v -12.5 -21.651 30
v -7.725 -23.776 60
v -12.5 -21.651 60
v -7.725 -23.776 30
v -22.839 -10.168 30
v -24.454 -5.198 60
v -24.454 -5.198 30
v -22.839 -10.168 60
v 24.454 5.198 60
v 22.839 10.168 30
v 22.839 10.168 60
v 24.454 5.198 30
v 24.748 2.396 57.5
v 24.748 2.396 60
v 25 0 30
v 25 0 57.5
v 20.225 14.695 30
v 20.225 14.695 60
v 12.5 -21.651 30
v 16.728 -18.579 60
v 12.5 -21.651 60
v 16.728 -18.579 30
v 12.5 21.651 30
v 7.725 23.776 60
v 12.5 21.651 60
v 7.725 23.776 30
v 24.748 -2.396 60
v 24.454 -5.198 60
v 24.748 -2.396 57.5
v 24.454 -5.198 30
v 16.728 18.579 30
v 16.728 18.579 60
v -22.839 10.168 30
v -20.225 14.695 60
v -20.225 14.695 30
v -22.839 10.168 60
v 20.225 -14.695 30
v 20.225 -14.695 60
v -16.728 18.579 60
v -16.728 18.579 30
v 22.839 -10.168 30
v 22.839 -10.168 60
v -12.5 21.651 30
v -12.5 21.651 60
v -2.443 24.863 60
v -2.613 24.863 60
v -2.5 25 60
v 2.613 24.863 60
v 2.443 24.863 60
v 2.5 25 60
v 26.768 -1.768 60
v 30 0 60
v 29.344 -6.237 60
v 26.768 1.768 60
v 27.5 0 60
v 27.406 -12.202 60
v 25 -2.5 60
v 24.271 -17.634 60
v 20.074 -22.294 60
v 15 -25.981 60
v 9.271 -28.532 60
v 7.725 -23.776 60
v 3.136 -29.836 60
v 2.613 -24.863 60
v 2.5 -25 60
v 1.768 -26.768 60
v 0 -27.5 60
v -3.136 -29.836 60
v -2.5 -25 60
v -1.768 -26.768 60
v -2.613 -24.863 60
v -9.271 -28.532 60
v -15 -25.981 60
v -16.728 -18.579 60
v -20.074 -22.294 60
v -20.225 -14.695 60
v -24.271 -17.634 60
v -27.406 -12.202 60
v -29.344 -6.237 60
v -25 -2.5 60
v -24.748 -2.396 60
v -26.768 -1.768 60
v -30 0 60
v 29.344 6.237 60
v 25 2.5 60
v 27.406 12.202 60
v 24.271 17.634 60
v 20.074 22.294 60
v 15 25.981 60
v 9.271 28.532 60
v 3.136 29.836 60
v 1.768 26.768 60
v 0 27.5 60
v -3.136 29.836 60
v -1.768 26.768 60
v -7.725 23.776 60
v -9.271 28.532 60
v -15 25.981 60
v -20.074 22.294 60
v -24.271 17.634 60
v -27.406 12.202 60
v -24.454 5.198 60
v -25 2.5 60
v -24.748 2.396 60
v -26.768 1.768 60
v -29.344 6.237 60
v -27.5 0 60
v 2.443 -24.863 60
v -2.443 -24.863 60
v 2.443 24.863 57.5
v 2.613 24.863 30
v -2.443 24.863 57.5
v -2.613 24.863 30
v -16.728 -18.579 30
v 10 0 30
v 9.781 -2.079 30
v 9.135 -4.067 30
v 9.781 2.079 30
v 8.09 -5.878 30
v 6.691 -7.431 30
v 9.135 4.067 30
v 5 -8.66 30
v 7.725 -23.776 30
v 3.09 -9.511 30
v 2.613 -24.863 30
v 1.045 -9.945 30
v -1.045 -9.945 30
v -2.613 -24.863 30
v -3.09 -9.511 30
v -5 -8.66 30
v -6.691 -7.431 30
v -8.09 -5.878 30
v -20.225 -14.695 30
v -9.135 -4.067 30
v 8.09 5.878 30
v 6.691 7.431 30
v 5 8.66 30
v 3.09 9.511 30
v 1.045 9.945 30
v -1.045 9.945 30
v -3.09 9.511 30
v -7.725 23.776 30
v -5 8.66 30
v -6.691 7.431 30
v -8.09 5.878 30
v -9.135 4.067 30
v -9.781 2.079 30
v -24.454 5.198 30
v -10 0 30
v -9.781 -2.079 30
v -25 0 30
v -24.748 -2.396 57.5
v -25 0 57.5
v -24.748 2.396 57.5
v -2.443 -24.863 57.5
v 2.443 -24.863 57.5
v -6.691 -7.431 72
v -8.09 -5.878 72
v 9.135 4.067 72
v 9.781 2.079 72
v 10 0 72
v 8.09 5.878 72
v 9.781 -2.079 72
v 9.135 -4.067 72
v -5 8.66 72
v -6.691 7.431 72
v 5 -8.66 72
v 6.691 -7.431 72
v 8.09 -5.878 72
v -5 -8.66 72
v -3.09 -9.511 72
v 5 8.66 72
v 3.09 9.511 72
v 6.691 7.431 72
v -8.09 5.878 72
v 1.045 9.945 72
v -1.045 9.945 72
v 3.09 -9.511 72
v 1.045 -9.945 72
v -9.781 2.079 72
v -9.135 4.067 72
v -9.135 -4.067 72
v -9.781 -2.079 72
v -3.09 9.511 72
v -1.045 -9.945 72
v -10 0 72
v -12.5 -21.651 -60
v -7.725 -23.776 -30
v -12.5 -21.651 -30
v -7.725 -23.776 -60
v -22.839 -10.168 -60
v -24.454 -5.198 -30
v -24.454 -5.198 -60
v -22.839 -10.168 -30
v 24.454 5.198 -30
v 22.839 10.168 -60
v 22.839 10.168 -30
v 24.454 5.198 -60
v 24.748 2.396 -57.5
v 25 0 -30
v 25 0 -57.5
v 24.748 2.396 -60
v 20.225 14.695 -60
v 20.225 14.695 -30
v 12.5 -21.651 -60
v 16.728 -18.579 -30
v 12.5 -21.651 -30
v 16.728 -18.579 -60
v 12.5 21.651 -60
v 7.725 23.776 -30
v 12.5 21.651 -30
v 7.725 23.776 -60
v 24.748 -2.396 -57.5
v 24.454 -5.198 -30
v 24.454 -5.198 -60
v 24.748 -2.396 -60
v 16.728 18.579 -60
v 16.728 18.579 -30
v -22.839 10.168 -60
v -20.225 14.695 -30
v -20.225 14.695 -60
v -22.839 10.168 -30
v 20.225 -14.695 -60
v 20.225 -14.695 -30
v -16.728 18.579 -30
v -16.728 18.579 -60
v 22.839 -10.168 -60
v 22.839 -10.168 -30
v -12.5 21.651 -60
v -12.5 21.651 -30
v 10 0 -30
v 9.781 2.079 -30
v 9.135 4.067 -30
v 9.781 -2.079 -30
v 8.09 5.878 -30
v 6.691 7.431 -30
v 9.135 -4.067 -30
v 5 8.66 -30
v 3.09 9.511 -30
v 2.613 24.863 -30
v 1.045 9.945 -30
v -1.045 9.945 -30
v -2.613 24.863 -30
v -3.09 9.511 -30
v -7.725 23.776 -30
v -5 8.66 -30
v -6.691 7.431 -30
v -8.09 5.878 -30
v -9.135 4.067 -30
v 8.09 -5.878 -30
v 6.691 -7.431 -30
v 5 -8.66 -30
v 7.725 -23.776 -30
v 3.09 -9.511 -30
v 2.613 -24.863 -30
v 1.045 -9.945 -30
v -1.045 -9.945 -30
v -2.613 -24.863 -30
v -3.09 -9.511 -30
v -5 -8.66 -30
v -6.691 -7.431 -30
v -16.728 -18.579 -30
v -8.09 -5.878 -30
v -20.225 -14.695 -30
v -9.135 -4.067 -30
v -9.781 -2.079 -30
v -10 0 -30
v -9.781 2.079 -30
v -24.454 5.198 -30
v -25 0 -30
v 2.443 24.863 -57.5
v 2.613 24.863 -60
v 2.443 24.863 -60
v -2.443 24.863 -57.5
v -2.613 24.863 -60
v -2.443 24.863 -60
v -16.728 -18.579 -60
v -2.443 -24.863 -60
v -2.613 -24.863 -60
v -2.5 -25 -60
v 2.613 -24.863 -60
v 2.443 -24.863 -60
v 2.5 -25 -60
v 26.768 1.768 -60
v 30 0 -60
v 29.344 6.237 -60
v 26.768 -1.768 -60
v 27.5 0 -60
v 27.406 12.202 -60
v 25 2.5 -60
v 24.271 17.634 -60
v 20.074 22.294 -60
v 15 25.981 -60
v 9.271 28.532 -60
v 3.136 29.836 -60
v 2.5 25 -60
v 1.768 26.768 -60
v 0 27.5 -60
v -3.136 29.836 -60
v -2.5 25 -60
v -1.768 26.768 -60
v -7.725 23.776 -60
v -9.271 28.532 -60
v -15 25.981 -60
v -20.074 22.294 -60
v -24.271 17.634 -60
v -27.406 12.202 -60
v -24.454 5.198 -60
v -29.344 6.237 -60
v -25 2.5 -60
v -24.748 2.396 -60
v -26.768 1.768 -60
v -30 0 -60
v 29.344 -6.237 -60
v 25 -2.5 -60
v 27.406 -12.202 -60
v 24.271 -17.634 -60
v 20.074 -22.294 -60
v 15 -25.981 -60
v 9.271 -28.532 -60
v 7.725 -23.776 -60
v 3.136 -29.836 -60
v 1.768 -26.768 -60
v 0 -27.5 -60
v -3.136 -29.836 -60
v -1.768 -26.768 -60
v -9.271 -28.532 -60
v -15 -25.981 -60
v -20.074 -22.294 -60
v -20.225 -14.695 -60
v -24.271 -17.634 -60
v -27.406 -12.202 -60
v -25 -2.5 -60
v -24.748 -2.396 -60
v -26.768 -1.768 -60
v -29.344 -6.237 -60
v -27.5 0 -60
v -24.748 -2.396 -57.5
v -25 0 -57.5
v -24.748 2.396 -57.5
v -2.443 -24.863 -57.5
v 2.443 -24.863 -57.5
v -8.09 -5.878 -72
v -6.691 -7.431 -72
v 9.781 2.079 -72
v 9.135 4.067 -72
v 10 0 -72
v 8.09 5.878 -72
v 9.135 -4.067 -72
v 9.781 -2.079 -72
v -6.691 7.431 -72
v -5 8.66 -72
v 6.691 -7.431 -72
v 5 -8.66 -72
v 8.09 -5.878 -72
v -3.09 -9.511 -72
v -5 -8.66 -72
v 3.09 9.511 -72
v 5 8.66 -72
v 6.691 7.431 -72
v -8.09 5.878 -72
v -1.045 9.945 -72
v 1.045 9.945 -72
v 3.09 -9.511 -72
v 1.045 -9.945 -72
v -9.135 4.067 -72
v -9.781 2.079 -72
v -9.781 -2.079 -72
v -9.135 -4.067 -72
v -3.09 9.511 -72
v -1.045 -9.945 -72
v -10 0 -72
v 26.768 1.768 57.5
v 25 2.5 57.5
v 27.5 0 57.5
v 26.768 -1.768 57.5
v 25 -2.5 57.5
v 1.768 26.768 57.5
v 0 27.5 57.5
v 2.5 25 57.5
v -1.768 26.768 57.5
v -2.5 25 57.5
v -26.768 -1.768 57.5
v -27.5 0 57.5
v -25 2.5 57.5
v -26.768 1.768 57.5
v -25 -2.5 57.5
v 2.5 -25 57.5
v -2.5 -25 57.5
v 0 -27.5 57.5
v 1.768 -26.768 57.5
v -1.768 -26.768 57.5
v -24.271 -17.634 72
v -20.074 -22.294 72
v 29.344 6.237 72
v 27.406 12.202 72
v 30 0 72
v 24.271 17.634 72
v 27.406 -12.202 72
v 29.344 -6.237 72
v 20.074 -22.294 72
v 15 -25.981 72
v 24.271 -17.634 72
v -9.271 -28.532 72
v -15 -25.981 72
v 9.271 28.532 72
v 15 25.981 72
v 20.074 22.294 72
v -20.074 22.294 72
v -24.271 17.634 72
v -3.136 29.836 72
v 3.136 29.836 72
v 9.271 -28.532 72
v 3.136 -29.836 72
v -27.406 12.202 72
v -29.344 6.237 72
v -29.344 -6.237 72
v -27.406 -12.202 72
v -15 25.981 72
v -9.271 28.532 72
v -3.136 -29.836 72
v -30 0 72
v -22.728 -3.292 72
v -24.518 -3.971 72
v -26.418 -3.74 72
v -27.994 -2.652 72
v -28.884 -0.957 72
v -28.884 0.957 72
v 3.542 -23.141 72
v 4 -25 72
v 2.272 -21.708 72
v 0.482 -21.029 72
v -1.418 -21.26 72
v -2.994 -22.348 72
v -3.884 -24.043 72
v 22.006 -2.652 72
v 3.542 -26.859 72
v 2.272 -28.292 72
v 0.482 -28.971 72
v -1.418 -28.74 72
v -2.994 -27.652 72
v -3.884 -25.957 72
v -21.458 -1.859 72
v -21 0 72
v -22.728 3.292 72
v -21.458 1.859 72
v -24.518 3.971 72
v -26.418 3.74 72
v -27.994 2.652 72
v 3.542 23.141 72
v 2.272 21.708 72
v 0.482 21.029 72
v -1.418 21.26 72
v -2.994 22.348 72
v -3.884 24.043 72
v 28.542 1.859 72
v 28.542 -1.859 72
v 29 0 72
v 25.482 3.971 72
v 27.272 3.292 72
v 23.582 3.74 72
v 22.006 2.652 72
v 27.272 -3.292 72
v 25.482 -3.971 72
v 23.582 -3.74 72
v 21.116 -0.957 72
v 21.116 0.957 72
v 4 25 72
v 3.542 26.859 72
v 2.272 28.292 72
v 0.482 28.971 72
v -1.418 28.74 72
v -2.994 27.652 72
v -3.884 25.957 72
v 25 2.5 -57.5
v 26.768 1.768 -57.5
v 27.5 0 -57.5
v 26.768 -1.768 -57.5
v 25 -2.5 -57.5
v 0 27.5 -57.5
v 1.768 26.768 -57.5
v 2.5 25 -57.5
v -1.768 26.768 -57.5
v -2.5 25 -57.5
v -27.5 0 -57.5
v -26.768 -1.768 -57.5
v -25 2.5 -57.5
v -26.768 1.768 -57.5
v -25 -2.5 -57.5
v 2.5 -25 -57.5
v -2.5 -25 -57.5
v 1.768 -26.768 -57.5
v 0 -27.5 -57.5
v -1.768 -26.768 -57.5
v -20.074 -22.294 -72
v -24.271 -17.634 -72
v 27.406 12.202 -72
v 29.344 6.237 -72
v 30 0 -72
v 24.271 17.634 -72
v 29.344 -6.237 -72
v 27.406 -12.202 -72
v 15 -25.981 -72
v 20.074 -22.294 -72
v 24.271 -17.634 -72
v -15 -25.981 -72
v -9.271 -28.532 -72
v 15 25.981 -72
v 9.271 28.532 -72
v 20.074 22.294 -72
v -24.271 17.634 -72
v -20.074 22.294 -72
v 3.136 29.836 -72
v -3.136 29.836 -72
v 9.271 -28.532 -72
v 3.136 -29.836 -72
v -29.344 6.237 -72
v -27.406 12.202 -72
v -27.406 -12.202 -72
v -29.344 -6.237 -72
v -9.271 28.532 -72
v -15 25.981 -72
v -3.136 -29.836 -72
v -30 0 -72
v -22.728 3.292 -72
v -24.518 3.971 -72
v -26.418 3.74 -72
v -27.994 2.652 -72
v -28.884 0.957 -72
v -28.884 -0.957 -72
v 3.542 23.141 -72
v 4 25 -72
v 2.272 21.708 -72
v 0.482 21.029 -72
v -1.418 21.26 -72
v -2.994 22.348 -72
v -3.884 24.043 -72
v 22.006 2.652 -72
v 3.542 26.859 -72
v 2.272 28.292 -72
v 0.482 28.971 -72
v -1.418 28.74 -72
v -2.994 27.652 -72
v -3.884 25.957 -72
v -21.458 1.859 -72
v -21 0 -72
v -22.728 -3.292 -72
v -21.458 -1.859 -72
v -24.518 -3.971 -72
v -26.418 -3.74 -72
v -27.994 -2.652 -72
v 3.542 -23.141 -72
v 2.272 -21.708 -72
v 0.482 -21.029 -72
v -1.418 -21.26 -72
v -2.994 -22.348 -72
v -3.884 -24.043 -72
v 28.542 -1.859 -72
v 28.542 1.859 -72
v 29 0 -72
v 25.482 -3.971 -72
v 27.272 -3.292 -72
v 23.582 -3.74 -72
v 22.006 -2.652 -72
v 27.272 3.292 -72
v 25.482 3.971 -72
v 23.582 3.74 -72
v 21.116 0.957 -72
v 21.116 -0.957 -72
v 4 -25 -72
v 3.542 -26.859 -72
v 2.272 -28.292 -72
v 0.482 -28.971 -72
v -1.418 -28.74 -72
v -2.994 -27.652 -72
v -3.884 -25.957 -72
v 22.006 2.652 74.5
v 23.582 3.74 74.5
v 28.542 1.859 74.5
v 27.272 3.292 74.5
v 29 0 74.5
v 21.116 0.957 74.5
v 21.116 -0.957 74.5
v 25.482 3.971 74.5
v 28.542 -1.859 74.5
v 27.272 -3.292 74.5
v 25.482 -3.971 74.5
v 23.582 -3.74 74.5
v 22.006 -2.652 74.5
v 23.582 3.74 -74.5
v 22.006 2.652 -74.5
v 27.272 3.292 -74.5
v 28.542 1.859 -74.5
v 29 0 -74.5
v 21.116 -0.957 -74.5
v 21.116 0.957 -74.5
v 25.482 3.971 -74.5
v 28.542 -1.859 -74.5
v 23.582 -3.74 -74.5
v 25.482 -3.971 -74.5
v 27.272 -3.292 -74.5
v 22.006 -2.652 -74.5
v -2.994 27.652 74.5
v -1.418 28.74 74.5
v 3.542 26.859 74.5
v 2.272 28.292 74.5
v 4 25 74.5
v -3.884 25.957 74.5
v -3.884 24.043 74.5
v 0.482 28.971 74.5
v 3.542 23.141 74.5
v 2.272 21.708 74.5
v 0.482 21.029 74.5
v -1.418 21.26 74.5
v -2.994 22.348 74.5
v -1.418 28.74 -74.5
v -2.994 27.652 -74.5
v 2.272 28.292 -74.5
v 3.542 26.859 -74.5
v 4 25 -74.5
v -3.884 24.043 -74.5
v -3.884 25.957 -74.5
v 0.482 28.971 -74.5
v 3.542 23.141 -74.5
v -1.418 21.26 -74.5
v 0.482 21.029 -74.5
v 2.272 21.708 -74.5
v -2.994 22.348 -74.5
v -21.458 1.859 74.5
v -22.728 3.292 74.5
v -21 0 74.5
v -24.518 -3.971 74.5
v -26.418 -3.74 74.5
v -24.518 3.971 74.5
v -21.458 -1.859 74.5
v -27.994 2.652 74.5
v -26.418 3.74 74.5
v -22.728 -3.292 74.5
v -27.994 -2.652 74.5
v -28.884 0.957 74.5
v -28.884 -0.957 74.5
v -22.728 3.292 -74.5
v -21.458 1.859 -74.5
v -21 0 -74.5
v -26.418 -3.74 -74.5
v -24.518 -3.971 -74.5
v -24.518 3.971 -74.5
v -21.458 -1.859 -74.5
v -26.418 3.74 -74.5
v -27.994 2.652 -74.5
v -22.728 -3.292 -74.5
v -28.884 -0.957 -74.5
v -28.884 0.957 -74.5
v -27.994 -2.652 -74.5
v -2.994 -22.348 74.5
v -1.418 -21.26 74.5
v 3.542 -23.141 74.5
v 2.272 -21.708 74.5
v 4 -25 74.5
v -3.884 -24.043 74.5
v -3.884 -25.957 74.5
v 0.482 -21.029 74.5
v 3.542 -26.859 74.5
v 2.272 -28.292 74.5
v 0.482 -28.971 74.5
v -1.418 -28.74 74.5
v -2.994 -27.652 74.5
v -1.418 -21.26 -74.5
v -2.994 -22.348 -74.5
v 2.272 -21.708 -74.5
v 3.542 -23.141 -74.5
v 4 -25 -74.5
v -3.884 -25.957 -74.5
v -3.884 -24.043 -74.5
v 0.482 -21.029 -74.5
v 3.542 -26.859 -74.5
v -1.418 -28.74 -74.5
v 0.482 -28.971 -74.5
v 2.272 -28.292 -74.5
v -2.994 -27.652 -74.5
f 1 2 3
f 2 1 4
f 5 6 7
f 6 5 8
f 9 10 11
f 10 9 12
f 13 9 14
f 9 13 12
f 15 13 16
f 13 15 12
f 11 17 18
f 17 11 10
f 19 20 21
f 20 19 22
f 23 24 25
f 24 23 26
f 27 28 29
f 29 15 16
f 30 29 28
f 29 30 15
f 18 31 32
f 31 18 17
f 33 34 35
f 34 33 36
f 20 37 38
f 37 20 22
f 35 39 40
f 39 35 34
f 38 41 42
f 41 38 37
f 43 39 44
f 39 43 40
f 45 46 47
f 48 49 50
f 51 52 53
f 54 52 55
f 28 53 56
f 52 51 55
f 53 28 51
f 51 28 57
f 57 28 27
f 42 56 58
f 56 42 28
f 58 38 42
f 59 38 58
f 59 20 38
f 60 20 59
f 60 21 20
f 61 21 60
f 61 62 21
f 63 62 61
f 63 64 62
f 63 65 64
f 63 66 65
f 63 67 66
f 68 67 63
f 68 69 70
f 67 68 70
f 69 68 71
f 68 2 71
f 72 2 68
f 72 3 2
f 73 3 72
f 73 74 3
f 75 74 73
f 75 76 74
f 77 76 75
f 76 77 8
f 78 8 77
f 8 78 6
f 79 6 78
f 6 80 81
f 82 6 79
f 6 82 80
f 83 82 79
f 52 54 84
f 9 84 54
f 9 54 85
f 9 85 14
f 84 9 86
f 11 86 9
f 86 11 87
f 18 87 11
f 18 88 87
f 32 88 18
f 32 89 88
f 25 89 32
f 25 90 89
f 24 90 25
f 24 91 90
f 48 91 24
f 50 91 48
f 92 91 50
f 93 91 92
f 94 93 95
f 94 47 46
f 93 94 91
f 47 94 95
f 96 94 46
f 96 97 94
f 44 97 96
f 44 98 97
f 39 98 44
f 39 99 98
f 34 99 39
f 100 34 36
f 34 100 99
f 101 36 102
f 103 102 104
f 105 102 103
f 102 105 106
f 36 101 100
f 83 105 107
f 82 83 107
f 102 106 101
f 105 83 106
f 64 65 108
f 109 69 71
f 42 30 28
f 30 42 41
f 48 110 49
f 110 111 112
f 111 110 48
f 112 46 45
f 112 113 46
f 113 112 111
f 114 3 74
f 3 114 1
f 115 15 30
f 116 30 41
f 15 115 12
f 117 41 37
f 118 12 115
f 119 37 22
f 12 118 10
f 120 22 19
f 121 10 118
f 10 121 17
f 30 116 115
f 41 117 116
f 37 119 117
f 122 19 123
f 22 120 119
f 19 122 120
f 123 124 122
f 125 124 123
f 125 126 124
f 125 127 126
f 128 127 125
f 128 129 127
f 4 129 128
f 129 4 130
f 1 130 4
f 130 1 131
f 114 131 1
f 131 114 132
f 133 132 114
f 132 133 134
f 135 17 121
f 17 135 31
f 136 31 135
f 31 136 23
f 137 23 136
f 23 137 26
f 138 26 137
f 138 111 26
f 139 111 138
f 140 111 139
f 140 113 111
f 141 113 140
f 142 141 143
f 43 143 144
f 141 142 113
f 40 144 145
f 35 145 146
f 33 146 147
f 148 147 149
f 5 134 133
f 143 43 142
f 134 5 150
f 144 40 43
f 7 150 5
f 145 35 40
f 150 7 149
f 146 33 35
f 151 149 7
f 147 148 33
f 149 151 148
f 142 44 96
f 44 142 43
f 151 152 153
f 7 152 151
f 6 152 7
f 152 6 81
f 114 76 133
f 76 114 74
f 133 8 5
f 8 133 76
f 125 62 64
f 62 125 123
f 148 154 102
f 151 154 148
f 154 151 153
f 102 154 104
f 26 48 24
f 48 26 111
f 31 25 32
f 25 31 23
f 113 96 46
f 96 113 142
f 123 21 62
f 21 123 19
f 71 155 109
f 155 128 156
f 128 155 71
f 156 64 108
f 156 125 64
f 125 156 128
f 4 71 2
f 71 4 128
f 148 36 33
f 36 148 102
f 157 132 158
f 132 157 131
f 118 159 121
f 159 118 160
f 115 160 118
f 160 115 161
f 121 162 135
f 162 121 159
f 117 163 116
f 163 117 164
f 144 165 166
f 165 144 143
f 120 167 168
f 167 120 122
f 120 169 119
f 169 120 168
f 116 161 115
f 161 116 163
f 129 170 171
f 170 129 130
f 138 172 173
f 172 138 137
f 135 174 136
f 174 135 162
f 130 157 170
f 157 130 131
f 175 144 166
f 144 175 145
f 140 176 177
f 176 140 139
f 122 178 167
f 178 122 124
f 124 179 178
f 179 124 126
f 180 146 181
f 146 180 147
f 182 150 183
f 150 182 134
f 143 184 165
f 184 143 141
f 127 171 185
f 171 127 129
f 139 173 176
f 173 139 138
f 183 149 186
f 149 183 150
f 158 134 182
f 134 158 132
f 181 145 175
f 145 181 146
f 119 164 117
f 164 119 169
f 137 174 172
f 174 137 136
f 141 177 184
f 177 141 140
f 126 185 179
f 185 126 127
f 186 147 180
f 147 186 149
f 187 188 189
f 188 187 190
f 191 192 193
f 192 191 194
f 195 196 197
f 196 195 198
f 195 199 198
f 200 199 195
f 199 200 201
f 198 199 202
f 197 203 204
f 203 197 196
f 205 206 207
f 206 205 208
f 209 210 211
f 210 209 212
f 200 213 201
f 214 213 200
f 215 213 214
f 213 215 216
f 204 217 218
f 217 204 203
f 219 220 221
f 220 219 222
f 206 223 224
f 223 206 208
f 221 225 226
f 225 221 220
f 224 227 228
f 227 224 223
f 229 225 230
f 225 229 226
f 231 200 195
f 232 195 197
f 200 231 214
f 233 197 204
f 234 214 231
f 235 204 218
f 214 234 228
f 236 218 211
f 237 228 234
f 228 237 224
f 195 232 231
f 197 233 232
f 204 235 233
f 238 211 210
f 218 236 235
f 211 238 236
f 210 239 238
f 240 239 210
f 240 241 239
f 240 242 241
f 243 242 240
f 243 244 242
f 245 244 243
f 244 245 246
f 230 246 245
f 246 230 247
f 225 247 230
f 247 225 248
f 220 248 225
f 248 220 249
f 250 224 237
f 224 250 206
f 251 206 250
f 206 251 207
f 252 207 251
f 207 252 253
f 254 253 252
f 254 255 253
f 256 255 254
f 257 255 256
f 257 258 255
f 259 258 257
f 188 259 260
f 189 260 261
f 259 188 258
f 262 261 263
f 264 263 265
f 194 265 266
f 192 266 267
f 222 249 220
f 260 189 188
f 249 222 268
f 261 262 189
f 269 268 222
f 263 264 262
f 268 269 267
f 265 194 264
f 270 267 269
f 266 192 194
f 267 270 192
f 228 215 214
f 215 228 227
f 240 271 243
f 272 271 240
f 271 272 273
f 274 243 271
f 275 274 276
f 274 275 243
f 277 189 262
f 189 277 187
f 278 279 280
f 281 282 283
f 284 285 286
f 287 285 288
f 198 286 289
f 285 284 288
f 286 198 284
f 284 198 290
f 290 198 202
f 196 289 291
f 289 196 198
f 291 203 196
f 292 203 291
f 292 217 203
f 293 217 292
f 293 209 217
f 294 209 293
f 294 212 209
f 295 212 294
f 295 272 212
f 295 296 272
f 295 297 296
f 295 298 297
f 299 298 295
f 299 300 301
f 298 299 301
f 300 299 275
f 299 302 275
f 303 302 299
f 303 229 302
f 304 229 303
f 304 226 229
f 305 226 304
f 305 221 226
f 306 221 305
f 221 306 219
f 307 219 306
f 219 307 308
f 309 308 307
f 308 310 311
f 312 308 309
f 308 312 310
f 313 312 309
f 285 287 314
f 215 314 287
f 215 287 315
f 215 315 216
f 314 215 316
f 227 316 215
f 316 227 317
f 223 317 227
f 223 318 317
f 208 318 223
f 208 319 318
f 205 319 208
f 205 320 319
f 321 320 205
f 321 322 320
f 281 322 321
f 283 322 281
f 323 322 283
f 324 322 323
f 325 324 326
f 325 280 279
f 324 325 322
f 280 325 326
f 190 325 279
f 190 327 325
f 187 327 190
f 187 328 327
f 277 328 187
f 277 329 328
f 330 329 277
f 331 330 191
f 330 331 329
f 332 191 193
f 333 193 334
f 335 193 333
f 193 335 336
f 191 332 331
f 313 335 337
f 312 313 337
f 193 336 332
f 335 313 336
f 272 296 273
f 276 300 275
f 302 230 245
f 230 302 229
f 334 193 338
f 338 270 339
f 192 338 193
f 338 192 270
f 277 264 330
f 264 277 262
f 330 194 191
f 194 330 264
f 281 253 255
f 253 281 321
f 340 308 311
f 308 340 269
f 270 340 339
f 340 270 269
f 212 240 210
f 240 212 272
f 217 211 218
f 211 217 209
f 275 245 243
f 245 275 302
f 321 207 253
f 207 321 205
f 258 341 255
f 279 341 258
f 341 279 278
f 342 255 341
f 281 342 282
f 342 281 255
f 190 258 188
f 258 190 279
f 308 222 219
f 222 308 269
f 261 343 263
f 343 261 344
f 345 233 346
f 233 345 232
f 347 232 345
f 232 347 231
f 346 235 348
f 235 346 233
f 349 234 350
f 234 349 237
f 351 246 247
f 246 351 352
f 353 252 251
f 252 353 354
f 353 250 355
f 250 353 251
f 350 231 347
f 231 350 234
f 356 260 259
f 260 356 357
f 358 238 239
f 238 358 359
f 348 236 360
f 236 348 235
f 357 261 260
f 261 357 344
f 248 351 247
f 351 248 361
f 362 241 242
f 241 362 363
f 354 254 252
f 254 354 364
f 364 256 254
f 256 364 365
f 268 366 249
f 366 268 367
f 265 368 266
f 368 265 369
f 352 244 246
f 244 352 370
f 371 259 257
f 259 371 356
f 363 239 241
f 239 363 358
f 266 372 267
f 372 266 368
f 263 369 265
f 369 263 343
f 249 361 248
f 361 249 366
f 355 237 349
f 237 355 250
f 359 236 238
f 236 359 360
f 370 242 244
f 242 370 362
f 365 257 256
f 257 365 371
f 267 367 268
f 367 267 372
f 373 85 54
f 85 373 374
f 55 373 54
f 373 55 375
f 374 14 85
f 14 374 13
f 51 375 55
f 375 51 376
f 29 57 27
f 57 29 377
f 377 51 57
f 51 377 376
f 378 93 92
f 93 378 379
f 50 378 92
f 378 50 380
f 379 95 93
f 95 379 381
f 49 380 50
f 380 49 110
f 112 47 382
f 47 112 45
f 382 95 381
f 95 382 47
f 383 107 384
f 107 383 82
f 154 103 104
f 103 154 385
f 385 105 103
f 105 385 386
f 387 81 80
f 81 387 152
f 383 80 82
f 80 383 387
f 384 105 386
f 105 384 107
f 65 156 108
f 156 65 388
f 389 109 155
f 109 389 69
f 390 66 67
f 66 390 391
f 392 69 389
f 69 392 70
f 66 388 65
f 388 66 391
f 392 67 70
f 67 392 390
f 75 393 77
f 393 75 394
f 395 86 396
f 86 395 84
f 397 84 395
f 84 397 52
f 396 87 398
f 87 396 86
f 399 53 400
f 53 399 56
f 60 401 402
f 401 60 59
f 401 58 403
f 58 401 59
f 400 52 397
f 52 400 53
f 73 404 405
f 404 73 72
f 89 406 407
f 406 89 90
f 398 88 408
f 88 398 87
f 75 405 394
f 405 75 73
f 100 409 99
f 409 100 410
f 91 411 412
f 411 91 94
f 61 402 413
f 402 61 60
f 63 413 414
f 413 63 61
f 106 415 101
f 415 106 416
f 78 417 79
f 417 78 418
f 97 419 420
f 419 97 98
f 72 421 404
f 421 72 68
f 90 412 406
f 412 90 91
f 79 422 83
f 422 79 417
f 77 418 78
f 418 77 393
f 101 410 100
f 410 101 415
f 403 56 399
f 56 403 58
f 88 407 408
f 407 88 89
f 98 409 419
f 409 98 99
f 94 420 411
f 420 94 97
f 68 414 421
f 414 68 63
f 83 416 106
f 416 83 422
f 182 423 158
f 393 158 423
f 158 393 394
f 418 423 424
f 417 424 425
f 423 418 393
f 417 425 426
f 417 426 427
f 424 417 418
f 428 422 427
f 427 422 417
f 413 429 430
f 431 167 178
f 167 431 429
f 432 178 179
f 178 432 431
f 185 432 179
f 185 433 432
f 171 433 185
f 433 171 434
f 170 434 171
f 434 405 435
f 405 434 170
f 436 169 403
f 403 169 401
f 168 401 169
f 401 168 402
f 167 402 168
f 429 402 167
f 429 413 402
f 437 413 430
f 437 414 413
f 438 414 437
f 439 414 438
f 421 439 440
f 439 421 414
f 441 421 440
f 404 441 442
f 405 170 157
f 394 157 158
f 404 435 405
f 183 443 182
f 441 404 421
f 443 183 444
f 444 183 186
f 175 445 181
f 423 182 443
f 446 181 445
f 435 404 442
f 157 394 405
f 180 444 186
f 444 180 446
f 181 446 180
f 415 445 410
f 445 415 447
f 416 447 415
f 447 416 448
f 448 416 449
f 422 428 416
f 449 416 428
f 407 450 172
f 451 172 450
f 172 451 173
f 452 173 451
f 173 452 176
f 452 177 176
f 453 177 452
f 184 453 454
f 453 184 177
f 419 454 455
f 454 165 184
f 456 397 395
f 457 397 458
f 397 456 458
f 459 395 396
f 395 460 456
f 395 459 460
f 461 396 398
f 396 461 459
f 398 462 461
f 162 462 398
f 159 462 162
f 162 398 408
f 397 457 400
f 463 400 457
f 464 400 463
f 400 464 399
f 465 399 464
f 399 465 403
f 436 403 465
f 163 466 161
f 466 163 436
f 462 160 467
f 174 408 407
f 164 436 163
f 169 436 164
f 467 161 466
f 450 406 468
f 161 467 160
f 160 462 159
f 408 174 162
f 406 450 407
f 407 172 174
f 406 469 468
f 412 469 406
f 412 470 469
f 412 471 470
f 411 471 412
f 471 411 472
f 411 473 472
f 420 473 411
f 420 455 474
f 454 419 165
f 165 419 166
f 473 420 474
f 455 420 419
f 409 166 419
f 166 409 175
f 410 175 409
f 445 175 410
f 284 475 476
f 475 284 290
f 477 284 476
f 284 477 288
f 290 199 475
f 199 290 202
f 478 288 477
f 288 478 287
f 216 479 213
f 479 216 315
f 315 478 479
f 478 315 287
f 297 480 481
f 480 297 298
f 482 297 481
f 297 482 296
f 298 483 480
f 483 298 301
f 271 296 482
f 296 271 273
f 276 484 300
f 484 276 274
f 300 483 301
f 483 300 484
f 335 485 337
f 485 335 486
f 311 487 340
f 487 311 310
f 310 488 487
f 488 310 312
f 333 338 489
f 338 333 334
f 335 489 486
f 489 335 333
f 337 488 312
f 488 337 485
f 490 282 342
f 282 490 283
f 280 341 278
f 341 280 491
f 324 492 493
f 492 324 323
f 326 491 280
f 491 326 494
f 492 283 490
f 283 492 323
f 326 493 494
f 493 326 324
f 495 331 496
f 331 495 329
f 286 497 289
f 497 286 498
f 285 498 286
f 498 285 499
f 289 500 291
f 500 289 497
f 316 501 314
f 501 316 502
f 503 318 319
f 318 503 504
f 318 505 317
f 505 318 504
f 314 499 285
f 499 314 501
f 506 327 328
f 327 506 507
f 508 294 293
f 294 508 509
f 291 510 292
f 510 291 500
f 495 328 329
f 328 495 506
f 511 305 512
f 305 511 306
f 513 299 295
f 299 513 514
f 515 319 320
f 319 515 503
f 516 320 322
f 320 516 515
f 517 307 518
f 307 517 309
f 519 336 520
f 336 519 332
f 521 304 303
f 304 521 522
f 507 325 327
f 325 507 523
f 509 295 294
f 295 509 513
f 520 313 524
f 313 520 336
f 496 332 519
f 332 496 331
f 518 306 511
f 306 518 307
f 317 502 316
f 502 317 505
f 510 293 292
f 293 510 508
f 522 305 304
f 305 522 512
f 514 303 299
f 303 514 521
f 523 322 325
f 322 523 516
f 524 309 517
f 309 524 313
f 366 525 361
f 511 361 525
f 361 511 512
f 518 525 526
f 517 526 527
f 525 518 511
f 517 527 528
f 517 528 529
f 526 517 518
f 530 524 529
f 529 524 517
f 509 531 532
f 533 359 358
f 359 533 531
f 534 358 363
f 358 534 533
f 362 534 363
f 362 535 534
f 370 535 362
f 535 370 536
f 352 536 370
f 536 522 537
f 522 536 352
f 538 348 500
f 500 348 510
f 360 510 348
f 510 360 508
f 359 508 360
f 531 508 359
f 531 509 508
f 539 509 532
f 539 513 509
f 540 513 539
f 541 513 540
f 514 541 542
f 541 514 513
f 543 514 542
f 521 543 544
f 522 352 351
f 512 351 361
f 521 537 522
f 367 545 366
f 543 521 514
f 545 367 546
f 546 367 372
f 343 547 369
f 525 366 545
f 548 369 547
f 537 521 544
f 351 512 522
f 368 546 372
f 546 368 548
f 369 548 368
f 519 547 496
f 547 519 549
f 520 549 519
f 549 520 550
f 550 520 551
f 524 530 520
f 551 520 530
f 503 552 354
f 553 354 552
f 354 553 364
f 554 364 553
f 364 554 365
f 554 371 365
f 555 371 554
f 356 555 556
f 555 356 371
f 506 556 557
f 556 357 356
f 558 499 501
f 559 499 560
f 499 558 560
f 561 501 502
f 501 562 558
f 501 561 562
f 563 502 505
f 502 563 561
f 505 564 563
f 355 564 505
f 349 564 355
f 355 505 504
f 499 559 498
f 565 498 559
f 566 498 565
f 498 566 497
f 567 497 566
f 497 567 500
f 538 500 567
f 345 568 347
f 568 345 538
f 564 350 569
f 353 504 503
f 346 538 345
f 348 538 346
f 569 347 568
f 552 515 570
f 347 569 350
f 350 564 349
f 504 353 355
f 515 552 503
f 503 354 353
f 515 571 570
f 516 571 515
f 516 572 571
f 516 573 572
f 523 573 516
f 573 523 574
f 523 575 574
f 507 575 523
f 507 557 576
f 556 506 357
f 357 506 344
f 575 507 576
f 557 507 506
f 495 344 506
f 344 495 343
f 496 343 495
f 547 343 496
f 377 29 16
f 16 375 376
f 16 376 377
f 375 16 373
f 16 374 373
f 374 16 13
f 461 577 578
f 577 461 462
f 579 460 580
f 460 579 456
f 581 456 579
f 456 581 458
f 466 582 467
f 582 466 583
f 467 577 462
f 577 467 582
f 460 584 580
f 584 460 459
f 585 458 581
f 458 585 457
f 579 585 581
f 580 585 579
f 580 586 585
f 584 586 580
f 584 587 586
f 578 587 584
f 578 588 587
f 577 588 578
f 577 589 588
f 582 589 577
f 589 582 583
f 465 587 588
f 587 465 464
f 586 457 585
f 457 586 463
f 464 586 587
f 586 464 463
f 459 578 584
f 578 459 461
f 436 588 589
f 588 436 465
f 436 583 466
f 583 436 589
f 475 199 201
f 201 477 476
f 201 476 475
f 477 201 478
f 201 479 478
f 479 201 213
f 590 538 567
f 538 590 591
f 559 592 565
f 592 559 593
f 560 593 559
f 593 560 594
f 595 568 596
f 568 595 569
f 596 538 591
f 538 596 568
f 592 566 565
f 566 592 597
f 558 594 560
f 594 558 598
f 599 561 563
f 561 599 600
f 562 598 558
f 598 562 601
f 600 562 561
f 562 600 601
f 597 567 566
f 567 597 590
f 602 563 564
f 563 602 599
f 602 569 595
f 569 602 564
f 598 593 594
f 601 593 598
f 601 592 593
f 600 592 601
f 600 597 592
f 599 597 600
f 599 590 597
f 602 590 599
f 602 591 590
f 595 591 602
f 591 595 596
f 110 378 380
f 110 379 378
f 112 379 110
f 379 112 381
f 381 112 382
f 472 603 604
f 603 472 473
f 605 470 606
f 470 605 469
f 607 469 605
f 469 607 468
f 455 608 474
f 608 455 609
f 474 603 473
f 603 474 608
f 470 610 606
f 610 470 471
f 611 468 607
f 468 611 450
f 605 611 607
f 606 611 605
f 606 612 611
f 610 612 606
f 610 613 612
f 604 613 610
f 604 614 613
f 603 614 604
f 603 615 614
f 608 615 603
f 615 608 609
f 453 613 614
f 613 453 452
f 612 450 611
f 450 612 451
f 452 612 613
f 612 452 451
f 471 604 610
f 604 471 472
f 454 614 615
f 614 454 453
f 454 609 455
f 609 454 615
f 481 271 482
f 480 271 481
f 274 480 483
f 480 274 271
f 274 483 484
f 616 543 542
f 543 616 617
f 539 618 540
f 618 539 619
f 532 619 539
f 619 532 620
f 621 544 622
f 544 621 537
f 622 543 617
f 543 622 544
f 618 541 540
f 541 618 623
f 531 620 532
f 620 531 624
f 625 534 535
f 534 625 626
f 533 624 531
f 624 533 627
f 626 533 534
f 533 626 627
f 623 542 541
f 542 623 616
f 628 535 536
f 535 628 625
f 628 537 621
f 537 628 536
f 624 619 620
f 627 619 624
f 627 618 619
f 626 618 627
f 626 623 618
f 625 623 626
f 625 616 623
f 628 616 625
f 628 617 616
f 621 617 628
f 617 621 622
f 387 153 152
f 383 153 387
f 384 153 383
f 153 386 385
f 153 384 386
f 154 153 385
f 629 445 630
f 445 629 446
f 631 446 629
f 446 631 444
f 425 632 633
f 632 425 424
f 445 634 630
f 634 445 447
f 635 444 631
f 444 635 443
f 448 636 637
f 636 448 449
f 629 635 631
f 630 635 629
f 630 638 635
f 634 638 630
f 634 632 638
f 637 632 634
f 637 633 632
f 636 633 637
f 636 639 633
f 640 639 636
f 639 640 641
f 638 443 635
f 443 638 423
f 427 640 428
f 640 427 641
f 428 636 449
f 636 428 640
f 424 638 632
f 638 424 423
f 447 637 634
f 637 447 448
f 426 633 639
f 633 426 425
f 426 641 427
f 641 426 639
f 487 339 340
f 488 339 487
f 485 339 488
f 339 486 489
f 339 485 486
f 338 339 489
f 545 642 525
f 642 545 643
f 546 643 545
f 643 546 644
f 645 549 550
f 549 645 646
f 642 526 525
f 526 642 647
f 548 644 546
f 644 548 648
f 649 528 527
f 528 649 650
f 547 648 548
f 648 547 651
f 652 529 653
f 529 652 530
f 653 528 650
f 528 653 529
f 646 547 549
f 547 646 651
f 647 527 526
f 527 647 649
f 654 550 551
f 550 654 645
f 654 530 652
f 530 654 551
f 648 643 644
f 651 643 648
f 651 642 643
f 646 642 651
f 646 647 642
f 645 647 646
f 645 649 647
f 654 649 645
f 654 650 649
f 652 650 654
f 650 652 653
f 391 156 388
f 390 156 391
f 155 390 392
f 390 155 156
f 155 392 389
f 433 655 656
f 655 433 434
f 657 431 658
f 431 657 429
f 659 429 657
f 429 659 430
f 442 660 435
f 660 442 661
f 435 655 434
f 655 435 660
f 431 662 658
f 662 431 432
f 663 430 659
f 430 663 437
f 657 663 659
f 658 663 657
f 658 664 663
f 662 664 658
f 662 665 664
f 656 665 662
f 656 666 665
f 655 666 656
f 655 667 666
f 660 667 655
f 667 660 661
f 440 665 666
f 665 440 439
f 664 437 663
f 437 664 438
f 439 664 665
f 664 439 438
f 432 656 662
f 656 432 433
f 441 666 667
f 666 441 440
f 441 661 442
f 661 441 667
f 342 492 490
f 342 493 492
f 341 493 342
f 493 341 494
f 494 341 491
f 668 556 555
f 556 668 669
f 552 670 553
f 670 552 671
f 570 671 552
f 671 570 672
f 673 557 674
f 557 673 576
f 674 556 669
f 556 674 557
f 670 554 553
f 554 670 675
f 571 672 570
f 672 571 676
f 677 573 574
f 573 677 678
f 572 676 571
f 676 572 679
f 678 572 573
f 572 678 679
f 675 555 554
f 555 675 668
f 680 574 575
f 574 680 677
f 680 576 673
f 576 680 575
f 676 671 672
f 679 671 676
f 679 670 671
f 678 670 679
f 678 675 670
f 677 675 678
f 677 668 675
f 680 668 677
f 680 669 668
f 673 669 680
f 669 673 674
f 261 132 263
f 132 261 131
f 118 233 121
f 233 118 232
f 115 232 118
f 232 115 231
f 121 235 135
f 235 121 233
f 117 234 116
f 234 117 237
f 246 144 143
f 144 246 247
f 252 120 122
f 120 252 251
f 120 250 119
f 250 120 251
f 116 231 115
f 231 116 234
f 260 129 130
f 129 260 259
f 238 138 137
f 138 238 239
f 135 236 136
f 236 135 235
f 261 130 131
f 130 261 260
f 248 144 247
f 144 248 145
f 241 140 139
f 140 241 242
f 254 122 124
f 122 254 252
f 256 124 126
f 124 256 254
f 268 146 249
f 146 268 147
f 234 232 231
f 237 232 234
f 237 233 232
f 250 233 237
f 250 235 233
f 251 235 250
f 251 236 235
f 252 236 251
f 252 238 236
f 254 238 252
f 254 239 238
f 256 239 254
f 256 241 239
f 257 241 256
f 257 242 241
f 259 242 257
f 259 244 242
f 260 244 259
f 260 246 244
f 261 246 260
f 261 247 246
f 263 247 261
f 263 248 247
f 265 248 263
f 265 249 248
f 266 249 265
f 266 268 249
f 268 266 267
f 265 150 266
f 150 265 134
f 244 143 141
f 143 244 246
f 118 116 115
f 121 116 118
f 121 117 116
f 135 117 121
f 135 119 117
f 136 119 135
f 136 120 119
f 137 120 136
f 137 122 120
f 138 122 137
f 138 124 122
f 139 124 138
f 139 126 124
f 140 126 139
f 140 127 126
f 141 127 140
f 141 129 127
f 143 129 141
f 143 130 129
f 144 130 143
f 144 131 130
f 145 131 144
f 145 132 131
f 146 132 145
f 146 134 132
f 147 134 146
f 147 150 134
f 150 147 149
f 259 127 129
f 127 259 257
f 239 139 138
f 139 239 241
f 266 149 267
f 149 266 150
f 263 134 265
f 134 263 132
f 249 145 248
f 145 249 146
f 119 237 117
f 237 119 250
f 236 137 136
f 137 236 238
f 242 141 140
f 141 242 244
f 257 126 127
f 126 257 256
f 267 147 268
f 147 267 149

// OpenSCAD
// Parameters
shaft_diameter = 20;
shaft_length = 60;
hub_diameter = 50;
hub_length = 30;
flange_diameter = 60;
flange_thickness = 5;
spacer_ring_thickness = 2;
bolt_diameter = 5;
bolt_length = 15; // Shortened bolts
nut_diameter = 8;
nut_thickness = 4;
bolt_hole_radius = 25;
num_bolts = 4;

// Central Shaft
module central_shaft() {
    cylinder(d=shaft_diameter, h=shaft_length, center=true);
}

// Hub
module hub() {
    difference() {
        cylinder(d=hub_diameter, h=hub_length, center=true);
        cylinder(d=shaft_diameter, h=hub_length + 2, center=true);
    }
}

// Flange Plate
module flange_plate() {
    difference() {
        cylinder(d=flange_diameter, h=flange_thickness, center=true);
        cylinder(d=shaft_diameter, h=flange_thickness + 2, center=true);
        for (i = [0:num_bolts-1]) {
            angle = i * 360 / num_bolts;
            translate([bolt_hole_radius * cos(angle), bolt_hole_radius * sin(angle), 0])
                cylinder(d=bolt_diameter, h=flange_thickness + 2, center=true);
        }
    }
}

// Spacer Ring
module spacer_ring() {
    difference() {
        cylinder(d=flange_diameter, h=spacer_ring_thickness, center=true);
        cylinder(d=shaft_diameter, h=spacer_ring_thickness + 2, center=true);
        for (i = [0:num_bolts-1]) {
            angle = i * 360 / num_bolts;
            translate([bolt_hole_radius * cos(angle), bolt_hole_radius * sin(angle), 0])
                cylinder(d=bolt_diameter, h=spacer_ring_thickness + 2, center=true);
        }
    }
}

// Bolt
module bolt() {
    cylinder(d=bolt_diameter, h=bolt_length, center=true);
}

// Nut
module nut() {
    cylinder(d=nut_diameter, h=nut_thickness, center=true);
}

// Assembly
module coupling() {
    // Central Shaft
    central_shaft();
    
    // Left Hub
    translate([0, 0, shaft_length / 2 + hub_length / 2]) hub();
    
    // Right Hub
    translate([0, 0, -shaft_length / 2 - hub_length / 2]) hub();
    
    // Left Flange Plates and Spacer Ring
    translate([0, 0, shaft_length / 2 + hub_length + flange_thickness / 2]) flange_plate();
    translate([0, 0, shaft_length / 2 + hub_length + flange_thickness + spacer_ring_thickness / 2]) spacer_ring();
    translate([0, 0, shaft_length / 2 + hub_length + flange_thickness + spacer_ring_thickness + flange_thickness / 2]) flange_plate();
    
    // Right Flange Plates and Spacer Ring
    translate([0, 0, -shaft_length / 2 - hub_length - flange_thickness / 2]) flange_plate();
    translate([0, 0, -shaft_length / 2 - hub_length - flange_thickness - spacer_ring_thickness / 2]) spacer_ring();
    translate([0, 0, -shaft_length / 2 - hub_length - flange_thickness - spacer_ring_thickness - flange_thickness / 2]) flange_plate();
    
    // Bolts and Nuts
    for (i = [0:num_bolts-1]) {
        angle = i * 360 / num_bolts;
        
        // Left Side Bolts
        translate([bolt_hole_radius * cos(angle), bolt_hole_radius * sin(angle), shaft_length / 2 + hub_length + flange_thickness])
            bolt();
        translate([bolt_hole_radius * cos(angle), bolt_hole_radius * sin(angle), shaft_length / 2 + hub_length + flange_thickness + bolt_length / 2])
            nut();
        
        // Right Side Bolts
        translate([bolt_hole_radius * cos(angle), bolt_hole_radius * sin(angle), -shaft_length / 2 - hub_length - flange_thickness])
            bolt();
        translate([bolt_hole_radius * cos(angle), bolt_hole_radius * sin(angle), -shaft_length / 2 - hub_length - flange_thickness - bolt_length / 2])
            nut();
    }
}

coupling();
